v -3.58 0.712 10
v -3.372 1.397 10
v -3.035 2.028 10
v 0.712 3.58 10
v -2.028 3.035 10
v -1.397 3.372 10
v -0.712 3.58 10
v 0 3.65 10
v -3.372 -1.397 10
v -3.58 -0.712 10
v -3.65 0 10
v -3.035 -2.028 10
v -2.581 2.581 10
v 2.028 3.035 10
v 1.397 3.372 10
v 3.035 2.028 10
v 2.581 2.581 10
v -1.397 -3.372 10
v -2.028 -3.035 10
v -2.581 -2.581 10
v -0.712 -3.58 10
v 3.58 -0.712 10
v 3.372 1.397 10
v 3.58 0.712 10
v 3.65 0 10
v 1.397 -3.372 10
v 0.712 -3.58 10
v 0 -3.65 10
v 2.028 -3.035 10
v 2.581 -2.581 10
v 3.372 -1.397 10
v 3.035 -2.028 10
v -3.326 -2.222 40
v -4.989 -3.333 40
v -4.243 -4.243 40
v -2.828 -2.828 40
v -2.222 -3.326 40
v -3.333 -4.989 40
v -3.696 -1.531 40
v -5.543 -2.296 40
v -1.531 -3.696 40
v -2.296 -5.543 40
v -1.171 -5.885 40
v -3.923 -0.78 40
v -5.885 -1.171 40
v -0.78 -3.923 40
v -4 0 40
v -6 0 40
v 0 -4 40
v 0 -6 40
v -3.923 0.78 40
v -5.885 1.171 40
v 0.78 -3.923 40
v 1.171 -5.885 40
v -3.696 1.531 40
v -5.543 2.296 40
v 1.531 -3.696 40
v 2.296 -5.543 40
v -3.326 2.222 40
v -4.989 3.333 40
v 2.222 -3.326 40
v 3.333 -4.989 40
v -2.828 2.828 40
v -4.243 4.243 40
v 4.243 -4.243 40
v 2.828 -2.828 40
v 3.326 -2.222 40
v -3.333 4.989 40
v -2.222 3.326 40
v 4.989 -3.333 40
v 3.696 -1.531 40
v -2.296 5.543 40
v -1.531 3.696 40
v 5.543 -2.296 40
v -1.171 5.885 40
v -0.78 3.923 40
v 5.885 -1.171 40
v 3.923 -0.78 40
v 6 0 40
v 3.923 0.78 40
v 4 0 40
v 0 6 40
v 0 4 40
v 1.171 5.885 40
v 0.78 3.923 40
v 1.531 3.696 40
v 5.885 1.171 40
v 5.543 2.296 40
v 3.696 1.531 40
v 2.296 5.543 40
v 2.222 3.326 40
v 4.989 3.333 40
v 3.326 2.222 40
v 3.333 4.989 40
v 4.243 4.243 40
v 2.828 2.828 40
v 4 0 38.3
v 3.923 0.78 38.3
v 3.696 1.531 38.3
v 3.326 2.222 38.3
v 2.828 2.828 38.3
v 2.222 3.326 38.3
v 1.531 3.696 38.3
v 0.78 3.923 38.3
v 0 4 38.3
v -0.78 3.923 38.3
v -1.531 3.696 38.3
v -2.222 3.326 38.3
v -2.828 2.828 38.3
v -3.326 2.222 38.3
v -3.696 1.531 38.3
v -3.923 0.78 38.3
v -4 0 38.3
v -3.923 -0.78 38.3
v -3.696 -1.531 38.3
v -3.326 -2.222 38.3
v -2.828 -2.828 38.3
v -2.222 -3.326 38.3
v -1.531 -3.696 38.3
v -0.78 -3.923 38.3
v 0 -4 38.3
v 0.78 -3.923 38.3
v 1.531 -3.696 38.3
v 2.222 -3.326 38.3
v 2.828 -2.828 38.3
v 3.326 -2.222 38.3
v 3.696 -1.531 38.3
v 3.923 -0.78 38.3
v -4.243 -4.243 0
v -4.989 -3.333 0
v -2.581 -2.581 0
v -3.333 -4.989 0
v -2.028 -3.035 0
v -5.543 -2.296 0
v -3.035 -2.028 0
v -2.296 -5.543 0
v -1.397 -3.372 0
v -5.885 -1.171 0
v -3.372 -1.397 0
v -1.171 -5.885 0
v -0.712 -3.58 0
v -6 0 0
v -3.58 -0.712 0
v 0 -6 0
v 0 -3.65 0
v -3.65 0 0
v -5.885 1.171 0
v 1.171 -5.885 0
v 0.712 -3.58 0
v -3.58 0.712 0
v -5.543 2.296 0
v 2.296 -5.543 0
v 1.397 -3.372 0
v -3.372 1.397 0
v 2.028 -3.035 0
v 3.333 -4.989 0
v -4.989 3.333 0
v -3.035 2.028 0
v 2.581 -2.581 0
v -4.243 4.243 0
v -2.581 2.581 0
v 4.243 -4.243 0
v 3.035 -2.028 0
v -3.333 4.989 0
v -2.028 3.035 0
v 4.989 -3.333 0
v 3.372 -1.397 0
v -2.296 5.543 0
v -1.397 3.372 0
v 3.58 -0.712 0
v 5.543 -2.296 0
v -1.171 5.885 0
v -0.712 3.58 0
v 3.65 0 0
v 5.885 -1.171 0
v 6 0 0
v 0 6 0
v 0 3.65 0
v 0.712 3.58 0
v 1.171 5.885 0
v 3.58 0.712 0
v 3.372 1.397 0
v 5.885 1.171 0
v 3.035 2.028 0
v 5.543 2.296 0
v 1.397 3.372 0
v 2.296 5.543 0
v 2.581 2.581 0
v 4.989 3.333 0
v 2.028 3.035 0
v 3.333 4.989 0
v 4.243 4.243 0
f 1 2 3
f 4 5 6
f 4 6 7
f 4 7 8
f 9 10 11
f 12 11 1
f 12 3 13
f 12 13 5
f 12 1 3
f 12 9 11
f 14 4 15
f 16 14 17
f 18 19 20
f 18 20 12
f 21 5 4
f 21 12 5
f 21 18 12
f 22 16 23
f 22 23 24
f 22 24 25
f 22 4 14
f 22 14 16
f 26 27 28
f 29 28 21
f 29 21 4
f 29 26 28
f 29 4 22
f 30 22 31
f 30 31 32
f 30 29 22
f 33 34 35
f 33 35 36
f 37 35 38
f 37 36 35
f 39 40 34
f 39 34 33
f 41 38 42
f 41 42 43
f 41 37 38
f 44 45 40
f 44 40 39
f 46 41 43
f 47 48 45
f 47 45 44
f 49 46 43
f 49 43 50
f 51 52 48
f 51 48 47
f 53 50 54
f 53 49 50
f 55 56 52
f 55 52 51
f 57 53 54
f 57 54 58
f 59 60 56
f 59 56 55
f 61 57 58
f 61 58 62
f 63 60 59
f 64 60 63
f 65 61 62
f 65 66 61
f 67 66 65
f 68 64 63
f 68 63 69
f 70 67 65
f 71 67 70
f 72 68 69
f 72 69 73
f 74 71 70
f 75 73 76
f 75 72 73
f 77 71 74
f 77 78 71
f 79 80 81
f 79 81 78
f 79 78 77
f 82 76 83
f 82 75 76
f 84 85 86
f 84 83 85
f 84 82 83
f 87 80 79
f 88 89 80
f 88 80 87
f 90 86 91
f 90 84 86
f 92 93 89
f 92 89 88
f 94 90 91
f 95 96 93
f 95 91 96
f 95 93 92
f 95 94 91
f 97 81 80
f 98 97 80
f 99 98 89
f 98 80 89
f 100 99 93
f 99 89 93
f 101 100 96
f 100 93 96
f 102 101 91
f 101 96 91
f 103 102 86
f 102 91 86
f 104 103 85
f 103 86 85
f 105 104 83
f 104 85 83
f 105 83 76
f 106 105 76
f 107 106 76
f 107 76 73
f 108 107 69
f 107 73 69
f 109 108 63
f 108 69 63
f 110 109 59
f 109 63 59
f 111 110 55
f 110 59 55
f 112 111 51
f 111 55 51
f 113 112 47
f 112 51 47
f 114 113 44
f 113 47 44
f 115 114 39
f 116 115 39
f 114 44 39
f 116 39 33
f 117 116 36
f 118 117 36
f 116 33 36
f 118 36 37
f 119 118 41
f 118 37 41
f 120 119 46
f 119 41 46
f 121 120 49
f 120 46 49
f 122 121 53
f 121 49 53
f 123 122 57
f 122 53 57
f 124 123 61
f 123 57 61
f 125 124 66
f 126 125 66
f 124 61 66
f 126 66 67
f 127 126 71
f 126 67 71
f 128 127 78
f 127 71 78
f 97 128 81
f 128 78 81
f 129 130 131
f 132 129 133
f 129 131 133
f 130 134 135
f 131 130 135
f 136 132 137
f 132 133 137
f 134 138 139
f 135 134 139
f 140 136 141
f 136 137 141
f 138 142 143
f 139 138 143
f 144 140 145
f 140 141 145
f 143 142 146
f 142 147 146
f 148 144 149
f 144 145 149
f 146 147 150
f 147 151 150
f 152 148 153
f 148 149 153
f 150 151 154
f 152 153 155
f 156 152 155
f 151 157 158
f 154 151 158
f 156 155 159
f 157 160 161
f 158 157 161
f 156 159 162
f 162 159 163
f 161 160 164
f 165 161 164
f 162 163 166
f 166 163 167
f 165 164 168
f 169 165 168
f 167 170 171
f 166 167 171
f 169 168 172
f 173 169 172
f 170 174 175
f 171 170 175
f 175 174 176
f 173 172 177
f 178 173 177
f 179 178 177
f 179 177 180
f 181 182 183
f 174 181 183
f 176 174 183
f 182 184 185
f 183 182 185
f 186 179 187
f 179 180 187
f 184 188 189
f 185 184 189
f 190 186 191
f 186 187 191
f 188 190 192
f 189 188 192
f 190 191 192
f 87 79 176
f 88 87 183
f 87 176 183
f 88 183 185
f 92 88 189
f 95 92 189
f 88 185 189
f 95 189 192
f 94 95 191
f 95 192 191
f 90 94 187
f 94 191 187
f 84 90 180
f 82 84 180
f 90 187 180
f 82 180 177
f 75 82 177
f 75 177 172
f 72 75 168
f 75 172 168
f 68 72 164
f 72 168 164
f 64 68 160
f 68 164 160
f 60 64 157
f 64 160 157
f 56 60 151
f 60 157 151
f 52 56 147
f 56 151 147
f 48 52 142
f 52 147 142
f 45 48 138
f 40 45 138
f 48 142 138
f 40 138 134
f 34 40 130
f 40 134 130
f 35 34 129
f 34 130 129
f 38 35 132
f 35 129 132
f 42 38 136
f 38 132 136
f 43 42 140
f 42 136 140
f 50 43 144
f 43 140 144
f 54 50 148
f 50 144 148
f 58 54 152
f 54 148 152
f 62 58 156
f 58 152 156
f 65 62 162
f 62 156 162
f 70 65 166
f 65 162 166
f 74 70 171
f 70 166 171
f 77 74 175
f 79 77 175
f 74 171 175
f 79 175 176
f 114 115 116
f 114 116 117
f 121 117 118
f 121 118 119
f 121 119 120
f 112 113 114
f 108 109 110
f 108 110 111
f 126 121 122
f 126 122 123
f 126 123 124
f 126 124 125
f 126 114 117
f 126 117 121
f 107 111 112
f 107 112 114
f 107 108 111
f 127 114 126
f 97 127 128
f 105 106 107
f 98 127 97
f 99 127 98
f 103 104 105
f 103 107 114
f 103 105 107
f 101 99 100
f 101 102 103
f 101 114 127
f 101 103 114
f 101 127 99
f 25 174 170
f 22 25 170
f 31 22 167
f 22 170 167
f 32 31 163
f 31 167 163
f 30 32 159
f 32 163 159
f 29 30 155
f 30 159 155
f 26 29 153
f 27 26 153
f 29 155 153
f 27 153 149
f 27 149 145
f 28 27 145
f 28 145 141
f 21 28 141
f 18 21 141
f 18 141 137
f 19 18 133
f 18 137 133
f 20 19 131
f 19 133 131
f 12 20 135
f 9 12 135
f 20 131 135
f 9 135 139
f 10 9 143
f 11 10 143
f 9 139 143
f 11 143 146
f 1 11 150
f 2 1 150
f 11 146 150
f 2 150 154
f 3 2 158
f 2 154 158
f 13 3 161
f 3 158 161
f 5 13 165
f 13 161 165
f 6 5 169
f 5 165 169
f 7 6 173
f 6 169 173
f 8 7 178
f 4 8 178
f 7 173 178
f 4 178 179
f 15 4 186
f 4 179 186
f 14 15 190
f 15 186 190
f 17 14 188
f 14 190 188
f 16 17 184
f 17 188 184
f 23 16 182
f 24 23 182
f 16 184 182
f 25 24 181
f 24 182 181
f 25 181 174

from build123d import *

# Parameters (mm, degrees)
SKETCH151_R     = 6
PAD111_DEPTH    = 40
SKETCH152_R     = 3.65
POCKET_DEPTH    = 10
SKETCH153_R     = 4
POCKET001_DEPTH = 1.7


with BuildPart() as part:
    # Sketch151 → Pad111 (new body)
    with BuildSketch(Plane.XY):
        Circle(SKETCH151_R)
    extrude(amount=PAD111_DEPTH)

    # Sketch152 (on Face2 of Pad111) → Pocket (cut)
    with BuildSketch(Plane(origin=(0, 0, 0), x_dir=(1, 0, 0), z_dir=(0, 0, -1))):
        Circle(SKETCH152_R)
    extrude(amount=-POCKET_DEPTH, mode=Mode.SUBTRACT)

    # Sketch153 (on Face3 of Pocket) → Pocket001 (cut)
    with BuildSketch(Plane.XY.offset(40)):
        Circle(SKETCH153_R)
    extrude(amount=-POCKET001_DEPTH, mode=Mode.SUBTRACT)


solid = part.part
